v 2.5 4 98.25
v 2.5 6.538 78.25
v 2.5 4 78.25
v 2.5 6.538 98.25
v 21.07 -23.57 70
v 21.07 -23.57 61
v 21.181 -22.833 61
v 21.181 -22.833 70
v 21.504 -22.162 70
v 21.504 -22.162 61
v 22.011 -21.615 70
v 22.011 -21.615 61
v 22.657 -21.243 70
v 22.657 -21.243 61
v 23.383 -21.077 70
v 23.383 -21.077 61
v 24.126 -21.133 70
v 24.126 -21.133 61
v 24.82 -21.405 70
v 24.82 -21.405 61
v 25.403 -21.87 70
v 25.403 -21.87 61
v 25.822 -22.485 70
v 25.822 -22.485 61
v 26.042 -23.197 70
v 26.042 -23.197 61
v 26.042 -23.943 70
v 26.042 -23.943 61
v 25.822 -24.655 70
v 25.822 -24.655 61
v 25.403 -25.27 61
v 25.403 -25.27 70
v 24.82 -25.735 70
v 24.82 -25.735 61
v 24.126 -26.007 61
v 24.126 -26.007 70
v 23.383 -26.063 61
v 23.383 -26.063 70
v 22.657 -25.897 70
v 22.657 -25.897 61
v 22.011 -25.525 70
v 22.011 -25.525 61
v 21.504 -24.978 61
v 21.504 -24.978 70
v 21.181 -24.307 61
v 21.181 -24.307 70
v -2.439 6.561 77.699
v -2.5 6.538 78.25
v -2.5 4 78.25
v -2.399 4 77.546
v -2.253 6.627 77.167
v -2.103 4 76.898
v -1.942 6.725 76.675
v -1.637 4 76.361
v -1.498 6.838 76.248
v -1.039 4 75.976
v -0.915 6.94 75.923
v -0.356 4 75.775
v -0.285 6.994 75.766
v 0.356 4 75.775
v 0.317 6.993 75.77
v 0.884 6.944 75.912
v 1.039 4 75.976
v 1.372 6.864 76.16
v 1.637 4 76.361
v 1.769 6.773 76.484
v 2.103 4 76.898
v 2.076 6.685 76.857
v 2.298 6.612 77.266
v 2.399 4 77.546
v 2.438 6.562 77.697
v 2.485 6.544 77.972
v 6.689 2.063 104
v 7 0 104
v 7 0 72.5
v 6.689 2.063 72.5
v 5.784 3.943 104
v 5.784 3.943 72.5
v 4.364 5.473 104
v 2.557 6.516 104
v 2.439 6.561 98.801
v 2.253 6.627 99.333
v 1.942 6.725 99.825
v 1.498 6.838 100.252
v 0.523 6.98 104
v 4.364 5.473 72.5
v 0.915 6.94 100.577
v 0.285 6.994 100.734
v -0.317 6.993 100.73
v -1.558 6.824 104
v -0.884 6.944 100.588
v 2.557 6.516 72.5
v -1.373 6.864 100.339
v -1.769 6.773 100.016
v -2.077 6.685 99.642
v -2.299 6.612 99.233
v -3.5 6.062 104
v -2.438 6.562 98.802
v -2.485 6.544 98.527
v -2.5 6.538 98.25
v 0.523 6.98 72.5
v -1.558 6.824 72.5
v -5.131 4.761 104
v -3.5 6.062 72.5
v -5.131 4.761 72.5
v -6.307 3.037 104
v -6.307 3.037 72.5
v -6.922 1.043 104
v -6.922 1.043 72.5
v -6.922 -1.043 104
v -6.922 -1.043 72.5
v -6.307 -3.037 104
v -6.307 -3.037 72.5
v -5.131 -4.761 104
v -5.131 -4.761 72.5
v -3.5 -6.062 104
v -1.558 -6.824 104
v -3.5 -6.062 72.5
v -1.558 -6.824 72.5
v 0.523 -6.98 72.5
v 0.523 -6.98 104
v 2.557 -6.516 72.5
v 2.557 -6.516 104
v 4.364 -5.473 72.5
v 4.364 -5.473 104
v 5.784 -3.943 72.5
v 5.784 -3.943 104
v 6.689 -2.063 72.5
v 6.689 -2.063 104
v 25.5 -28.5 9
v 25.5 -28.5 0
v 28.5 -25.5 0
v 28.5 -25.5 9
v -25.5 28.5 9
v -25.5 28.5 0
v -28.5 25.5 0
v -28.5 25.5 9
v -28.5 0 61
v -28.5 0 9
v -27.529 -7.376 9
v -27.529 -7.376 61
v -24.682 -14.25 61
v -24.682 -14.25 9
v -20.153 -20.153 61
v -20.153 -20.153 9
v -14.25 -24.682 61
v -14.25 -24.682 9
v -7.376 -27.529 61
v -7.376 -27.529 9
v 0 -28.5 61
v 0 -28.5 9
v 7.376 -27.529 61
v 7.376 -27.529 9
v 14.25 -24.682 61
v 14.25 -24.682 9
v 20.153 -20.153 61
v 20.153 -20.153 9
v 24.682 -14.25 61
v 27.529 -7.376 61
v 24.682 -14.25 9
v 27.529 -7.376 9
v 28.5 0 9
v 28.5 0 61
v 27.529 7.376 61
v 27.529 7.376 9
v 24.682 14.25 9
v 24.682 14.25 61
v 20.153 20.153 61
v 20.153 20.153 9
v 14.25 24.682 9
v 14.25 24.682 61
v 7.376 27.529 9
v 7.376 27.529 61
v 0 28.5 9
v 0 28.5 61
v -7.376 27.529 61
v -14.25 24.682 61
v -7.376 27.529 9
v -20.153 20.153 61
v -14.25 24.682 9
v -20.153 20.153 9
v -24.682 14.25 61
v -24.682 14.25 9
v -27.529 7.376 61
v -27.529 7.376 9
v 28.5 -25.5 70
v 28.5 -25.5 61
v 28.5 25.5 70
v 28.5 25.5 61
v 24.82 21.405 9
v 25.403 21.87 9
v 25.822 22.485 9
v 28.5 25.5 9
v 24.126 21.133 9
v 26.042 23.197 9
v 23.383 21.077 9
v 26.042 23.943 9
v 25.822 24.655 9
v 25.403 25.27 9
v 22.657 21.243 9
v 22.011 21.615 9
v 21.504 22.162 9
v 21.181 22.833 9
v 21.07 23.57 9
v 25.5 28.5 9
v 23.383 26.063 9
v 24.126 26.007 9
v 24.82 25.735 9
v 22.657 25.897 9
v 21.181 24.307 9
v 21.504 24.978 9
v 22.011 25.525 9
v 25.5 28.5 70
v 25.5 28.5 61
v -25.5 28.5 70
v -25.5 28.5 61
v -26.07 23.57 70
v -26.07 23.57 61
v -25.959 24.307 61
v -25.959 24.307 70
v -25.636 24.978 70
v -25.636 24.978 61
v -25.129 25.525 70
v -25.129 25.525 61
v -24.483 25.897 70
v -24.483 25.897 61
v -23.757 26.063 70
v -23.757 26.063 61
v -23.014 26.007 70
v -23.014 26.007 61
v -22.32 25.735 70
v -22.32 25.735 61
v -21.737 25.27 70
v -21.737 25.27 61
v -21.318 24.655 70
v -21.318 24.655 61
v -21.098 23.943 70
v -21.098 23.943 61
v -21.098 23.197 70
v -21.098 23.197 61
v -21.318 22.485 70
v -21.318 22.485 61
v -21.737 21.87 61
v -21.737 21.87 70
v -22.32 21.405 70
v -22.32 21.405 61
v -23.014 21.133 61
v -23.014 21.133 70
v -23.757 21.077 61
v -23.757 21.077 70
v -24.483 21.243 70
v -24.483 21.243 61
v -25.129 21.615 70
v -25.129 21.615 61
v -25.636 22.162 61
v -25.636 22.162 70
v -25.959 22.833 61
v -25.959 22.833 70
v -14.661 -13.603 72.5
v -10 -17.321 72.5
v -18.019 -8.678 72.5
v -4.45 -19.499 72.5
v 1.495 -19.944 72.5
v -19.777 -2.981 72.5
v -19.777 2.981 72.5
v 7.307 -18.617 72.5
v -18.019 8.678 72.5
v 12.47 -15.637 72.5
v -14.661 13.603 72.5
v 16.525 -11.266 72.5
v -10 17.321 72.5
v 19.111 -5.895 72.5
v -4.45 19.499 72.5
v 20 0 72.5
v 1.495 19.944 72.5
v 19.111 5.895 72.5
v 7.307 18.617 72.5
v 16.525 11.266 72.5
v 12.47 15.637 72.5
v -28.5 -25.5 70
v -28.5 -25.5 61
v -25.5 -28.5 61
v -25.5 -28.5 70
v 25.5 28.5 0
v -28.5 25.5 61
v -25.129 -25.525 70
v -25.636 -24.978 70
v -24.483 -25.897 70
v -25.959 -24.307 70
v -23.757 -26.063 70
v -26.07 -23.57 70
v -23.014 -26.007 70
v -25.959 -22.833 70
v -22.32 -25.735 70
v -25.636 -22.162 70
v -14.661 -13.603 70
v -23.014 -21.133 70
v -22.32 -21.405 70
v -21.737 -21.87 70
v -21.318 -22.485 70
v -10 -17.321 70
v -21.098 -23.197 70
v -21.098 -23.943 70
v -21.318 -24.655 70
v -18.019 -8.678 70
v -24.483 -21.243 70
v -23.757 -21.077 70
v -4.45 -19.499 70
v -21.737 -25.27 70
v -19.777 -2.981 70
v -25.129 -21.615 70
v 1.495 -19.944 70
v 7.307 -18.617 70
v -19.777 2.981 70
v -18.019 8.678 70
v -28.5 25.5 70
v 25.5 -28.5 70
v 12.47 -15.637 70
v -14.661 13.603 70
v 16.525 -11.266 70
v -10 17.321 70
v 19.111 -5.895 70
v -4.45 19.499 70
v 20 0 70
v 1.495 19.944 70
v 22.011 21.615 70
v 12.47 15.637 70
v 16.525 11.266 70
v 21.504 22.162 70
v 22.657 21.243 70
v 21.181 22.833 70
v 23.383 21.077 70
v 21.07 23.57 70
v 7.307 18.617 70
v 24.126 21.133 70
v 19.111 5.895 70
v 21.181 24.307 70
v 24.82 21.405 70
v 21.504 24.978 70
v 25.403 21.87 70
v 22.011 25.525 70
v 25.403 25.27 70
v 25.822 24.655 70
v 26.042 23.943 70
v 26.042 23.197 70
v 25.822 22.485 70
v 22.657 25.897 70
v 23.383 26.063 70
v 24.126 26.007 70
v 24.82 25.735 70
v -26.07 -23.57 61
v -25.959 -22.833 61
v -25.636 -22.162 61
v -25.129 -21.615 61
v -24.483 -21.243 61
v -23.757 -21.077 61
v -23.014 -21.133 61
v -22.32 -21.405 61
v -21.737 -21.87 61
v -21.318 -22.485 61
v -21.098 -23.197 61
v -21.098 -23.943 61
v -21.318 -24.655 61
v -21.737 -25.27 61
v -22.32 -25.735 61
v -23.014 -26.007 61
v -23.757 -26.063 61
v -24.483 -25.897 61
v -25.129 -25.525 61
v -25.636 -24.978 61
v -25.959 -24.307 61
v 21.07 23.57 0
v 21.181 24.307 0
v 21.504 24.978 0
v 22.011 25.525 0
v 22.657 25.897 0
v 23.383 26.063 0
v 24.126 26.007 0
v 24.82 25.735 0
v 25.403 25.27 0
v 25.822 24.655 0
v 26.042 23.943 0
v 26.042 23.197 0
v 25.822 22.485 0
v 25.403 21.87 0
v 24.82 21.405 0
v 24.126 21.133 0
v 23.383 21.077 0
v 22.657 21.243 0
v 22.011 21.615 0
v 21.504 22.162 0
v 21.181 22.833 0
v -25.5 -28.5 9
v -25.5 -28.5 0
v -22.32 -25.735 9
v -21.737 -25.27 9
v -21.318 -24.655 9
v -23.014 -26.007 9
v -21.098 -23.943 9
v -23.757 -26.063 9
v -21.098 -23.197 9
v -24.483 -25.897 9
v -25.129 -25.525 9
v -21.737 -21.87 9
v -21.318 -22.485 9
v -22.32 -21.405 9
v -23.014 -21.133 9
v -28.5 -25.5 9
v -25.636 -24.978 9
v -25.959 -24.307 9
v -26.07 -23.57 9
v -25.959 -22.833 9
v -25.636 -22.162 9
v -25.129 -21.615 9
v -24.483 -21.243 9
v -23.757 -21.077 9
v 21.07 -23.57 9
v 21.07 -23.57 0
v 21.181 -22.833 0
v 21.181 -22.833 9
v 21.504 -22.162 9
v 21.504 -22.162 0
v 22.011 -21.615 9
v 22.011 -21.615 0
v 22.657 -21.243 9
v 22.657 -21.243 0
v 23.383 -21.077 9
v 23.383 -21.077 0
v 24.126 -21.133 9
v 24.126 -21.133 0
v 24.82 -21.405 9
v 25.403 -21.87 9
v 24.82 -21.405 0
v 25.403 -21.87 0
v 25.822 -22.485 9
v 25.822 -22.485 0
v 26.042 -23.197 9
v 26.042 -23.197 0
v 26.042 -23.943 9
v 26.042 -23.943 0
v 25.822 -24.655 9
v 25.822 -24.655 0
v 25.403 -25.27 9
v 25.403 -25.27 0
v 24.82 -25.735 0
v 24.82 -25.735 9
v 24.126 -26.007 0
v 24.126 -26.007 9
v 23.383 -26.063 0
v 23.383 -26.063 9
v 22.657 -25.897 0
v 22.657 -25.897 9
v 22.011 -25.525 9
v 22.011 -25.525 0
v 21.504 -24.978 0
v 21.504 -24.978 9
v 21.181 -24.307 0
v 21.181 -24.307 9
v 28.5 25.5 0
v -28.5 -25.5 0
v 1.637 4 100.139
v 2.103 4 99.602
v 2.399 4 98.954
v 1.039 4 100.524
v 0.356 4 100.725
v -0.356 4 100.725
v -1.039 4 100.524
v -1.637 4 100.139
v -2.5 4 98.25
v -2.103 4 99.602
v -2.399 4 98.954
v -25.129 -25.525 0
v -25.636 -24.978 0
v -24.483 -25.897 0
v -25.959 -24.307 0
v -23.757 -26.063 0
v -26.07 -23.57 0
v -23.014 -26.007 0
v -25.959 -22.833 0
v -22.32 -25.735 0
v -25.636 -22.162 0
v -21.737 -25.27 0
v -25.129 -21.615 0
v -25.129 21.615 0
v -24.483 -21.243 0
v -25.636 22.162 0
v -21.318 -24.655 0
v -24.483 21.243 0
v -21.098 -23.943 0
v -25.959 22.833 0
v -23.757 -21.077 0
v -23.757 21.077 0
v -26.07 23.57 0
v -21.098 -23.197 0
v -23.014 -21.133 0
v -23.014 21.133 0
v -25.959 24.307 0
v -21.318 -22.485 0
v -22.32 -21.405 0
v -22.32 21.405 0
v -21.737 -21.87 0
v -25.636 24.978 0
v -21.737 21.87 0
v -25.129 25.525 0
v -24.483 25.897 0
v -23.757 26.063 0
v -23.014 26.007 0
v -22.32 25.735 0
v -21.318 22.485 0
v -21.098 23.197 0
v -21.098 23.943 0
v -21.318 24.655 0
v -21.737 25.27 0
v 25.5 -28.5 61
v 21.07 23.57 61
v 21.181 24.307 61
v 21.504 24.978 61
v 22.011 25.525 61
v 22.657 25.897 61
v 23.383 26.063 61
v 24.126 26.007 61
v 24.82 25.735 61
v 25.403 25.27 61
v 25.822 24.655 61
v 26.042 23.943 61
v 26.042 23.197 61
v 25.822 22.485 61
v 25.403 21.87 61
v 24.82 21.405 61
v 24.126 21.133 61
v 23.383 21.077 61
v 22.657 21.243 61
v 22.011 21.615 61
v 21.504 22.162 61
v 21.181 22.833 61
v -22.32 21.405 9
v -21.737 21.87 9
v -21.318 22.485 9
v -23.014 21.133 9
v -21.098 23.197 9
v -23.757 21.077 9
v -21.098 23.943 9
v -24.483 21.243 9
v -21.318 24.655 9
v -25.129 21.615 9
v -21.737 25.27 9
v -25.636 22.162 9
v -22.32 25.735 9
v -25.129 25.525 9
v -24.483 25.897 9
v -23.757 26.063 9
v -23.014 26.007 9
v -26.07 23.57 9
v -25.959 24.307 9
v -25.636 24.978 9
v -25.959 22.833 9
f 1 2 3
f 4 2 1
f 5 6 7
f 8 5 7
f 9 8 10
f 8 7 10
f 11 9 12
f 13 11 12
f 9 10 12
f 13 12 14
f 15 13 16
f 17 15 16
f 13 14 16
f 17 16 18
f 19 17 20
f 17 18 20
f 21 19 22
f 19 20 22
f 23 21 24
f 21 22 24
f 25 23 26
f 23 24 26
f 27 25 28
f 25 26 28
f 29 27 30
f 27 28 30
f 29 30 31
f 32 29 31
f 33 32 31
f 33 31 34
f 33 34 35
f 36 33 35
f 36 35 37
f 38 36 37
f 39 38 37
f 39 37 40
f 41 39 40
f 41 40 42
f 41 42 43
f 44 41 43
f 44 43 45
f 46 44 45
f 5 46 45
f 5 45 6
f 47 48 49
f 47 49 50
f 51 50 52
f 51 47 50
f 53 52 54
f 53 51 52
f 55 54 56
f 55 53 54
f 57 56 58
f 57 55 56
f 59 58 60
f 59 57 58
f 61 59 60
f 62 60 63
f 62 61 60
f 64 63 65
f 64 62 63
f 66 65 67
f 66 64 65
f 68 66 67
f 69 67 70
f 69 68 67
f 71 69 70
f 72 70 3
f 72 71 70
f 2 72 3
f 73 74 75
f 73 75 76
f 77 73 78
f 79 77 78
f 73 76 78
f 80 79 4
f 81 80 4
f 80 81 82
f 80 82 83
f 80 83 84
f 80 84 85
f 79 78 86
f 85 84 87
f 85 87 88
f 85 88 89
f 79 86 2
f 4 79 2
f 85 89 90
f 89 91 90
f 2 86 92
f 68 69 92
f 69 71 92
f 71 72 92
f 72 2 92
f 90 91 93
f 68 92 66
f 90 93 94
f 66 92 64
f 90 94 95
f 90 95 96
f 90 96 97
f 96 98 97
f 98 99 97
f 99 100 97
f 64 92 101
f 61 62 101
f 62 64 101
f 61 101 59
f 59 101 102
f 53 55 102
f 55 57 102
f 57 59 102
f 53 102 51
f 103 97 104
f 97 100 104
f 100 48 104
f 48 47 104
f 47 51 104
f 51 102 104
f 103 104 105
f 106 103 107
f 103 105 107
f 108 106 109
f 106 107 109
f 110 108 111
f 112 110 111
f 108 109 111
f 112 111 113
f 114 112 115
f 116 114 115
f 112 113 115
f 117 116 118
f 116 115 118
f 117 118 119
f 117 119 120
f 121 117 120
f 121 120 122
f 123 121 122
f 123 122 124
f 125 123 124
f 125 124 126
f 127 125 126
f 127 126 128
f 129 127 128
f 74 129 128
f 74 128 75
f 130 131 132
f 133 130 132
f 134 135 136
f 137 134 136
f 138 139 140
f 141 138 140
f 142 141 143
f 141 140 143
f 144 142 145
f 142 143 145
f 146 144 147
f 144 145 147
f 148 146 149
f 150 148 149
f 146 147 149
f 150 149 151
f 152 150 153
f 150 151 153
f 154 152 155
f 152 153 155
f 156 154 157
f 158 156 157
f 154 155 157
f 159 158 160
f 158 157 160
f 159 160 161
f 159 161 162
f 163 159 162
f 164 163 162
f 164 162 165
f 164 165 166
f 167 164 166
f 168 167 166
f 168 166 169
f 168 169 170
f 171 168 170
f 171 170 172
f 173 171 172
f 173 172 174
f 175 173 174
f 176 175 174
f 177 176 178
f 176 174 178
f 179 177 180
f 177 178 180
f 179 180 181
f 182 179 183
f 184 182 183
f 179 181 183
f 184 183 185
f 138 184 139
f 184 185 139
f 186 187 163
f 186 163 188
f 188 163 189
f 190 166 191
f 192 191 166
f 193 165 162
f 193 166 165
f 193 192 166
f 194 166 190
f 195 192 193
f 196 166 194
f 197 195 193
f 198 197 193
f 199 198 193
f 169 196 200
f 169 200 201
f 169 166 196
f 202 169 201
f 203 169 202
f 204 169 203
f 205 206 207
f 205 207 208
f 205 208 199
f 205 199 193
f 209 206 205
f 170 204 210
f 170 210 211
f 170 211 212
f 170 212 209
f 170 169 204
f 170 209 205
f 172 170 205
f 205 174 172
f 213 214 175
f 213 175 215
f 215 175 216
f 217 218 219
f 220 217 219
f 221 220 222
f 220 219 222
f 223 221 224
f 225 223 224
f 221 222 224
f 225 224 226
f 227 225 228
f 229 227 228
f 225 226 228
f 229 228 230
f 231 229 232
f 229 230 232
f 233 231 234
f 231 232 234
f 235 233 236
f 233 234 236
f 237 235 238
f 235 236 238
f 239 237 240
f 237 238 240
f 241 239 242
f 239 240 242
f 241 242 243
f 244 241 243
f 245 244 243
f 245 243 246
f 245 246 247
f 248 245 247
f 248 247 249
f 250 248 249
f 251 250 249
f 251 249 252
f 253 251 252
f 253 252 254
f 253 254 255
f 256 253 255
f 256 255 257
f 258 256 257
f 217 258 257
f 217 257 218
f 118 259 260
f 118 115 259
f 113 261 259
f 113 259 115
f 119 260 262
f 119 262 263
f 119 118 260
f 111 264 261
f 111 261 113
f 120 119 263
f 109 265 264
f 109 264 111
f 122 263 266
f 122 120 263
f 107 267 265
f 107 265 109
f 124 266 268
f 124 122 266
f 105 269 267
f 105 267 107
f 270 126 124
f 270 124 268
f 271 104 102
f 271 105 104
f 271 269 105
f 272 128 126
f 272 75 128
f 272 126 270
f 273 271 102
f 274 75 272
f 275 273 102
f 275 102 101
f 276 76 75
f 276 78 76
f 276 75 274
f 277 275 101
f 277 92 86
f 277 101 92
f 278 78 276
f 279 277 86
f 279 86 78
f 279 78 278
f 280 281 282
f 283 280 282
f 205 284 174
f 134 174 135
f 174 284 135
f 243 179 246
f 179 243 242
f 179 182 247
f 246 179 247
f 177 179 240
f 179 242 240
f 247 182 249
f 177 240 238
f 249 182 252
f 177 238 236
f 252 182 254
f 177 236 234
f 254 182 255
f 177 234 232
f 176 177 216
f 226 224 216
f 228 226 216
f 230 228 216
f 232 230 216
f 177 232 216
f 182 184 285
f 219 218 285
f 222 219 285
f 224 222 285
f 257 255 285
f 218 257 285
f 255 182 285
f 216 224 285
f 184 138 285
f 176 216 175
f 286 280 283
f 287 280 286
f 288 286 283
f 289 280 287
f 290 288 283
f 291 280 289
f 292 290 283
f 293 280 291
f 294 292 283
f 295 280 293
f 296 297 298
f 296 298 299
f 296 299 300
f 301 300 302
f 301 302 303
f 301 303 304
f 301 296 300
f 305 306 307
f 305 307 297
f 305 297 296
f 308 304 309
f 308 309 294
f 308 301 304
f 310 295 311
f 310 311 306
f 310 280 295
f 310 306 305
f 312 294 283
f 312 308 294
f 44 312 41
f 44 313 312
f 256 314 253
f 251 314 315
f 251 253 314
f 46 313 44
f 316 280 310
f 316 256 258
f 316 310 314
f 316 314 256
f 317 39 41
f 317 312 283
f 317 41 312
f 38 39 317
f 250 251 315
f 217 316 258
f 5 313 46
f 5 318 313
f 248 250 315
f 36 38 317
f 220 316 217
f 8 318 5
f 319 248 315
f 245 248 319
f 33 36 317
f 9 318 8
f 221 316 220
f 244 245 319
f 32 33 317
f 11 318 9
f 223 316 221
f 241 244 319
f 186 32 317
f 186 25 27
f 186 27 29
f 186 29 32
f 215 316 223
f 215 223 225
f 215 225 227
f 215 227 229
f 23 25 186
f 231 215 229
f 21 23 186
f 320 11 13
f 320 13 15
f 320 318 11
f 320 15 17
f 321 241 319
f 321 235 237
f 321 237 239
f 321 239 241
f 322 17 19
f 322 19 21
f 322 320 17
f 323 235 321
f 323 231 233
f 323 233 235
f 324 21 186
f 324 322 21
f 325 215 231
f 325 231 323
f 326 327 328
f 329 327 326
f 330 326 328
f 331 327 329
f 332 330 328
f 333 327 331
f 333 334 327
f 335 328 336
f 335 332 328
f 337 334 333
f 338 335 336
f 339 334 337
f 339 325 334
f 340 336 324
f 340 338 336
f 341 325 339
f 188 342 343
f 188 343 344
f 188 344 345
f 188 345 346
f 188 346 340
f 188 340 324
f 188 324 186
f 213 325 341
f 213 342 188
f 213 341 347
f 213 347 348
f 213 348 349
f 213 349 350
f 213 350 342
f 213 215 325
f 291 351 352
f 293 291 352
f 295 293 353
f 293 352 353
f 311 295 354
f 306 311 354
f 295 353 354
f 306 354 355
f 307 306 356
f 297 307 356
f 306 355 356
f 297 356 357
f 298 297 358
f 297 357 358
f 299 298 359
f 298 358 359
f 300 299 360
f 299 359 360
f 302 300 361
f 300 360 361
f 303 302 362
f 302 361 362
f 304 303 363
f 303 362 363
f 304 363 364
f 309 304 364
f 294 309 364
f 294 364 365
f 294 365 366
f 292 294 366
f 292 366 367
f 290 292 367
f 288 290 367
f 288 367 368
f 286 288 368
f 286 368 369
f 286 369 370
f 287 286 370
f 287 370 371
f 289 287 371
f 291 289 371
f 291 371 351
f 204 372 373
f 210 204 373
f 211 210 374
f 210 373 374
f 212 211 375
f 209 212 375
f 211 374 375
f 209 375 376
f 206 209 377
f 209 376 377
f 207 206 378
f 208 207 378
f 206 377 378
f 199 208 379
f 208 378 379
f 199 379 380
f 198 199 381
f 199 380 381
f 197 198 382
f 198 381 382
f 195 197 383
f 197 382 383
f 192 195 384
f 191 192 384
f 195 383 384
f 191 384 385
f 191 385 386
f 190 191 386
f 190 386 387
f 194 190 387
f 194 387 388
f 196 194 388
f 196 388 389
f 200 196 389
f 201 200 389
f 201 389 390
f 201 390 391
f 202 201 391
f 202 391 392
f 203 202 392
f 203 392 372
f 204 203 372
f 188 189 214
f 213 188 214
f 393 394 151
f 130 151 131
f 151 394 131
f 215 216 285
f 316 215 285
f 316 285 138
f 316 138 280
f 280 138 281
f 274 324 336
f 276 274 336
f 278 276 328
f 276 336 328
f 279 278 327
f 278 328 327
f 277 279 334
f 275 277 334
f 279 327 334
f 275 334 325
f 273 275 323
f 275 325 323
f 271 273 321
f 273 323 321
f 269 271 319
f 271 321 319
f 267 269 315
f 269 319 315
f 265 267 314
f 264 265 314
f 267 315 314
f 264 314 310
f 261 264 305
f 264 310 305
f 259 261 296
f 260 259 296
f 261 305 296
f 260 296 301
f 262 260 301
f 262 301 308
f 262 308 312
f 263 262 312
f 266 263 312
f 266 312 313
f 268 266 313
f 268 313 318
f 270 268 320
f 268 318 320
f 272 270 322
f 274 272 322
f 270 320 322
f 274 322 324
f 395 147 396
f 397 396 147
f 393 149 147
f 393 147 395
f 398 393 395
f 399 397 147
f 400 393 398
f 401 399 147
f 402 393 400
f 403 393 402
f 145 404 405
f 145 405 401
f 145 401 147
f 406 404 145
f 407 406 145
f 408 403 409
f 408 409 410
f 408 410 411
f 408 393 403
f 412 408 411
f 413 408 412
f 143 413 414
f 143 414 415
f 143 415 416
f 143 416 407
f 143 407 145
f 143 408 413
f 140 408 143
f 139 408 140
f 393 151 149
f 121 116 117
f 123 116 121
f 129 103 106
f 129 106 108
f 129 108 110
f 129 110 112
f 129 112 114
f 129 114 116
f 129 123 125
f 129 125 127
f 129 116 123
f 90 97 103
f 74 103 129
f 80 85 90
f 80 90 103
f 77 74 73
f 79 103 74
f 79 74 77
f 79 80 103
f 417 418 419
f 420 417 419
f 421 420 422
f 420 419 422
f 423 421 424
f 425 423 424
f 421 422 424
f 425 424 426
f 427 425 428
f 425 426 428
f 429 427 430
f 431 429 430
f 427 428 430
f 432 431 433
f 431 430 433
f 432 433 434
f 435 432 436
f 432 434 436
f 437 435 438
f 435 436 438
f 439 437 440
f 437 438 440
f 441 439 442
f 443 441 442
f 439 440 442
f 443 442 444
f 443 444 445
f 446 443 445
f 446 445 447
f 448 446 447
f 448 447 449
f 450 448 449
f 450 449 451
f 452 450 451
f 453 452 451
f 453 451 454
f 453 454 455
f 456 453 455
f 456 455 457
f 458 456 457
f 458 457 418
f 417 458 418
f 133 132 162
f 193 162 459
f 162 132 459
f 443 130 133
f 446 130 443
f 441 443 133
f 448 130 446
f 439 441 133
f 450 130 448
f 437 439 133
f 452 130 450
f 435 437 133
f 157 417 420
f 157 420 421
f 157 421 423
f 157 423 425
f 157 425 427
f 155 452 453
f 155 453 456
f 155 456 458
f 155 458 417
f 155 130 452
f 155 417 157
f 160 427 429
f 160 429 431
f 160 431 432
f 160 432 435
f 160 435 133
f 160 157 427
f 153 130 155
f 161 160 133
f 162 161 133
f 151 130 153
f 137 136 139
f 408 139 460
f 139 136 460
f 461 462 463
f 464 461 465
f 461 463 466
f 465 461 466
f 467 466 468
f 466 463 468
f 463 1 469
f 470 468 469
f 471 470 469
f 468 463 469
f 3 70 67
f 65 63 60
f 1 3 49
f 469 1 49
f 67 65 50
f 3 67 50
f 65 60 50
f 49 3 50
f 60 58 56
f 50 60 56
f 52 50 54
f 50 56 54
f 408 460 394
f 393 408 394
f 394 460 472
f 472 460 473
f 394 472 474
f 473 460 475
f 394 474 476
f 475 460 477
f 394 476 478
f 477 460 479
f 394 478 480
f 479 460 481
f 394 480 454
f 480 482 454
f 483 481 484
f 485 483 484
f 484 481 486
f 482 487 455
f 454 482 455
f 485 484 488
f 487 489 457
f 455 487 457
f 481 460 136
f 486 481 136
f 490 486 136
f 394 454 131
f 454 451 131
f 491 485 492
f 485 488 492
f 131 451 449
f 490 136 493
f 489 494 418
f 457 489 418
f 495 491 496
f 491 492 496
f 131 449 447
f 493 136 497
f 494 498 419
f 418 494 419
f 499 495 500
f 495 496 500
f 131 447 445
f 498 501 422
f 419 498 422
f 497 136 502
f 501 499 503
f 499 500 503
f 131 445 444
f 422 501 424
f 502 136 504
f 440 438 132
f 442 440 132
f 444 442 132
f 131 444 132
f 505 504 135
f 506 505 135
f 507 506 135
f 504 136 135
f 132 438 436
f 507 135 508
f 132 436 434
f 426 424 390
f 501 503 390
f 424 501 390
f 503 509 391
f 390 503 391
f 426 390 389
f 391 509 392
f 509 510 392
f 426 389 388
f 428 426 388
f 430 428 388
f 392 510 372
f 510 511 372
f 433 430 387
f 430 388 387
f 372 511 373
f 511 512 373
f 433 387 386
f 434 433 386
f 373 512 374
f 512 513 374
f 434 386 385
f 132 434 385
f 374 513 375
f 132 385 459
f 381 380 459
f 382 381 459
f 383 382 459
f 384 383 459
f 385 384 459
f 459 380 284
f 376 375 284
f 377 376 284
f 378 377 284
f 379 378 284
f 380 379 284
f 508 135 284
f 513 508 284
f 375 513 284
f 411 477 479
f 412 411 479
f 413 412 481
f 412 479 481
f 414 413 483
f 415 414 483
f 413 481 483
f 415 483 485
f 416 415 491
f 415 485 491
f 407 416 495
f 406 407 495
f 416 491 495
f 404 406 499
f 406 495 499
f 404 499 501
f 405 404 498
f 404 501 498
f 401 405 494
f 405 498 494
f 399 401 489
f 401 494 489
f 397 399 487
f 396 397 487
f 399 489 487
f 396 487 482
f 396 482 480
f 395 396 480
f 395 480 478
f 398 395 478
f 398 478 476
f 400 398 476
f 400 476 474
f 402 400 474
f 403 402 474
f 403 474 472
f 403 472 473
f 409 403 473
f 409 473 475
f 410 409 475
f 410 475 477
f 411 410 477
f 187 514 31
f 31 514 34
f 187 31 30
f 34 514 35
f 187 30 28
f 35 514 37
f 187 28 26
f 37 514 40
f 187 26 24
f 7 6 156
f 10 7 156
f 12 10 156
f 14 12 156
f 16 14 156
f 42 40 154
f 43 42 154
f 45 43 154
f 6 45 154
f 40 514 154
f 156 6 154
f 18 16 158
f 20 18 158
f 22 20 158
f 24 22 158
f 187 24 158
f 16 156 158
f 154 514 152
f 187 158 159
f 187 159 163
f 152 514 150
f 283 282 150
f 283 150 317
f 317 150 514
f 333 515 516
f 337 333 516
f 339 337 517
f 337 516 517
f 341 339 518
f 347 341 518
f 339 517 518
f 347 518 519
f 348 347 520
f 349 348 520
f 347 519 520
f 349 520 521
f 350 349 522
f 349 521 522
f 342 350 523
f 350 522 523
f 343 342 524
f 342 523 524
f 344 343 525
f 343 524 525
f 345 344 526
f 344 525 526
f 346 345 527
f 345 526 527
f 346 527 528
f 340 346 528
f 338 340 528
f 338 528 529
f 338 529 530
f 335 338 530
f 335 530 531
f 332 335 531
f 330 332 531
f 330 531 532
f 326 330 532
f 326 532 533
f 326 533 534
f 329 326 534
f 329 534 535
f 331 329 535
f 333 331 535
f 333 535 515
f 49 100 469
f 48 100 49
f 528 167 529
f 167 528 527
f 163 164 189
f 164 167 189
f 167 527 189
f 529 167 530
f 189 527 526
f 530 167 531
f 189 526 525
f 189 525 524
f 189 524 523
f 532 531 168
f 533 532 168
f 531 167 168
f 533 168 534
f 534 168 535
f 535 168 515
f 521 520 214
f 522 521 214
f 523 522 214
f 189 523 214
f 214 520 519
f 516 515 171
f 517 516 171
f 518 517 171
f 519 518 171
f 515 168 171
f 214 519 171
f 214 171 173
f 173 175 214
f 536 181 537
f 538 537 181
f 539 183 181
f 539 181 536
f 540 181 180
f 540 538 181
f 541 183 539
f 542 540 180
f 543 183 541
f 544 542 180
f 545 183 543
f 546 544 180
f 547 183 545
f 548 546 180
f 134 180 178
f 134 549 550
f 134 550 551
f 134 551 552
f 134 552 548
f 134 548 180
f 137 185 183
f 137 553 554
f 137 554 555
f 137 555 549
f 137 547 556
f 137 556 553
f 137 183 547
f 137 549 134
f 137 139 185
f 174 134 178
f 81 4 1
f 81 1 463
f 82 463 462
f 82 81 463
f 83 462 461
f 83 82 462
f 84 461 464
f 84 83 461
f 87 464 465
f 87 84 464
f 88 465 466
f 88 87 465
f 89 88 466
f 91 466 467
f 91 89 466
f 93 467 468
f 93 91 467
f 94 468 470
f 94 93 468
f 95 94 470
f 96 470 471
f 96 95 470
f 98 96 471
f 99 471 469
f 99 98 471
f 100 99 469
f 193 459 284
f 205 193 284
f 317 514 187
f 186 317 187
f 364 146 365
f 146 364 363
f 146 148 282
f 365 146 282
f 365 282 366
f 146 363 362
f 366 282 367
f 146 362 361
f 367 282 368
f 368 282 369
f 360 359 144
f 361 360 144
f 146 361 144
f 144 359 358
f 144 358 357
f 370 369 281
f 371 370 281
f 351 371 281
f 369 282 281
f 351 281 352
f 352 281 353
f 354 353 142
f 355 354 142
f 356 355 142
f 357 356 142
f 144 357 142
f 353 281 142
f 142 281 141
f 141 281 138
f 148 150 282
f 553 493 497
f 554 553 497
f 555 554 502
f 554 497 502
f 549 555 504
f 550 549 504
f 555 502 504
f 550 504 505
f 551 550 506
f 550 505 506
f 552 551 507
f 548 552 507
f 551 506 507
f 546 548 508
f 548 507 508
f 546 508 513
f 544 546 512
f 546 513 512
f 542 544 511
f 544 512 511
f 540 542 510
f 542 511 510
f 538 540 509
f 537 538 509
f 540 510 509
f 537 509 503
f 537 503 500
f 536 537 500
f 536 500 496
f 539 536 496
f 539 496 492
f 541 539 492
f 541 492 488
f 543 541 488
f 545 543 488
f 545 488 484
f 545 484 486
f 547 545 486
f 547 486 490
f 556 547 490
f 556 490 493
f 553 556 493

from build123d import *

# Parameters (mm, degrees)
BOSS_EXTRUDE1_DEPTH     = 70
SKETCH2_R               = 2.5
CUT_EXTRUDE1_DEPTH      = 81.774377125
CUT_EXTRUDE2_DEPTH      = 81.774377125
CUT_EXTRUDE2_DEPTH_BACK = 81.774377125
SKETCH3_W               = 52
SKETCH3_H               = 57
SKETCH4_R               = 28.5
BOSS_EXTRUDE2_DEPTH     = 52
SKETCH5_R               = 20
BOSS_EXTRUDE3_DEPTH     = 2.5
SKETCH6_R               = 7
BOSS_EXTRUDE4_DEPTH     = 31.5
CUT_EXTRUDE3_DEPTH      = 5


with BuildPart() as part:
    # Sketch1 → Boss-Extrude1 (new body)
    with BuildSketch(Plane.XY):
        Polygon((-28.5, -25.5), (-25.5, -28.5), (25.5, -28.5), (28.5, -25.5), (28.5, 25.5), (25.5, 28.5), (-25.5, 28.5), (-28.5, 25.5), align=None)
    extrude(amount=BOSS_EXTRUDE1_DEPTH)

    # Sketch2 → Cut-Extrude1 (cut, through all)
    with BuildSketch(Plane(origin=(0, 0, 0), x_dir=(-1, 0, 0), z_dir=(0, 0, -1))):
        with Locations((-23.57, 23.57)):
            Circle(SKETCH2_R)
        with Locations((-23.57, -23.57)):
            Circle(SKETCH2_R)
        with Locations((23.57, -23.57)):
            Circle(SKETCH2_R)
        with Locations((23.57, 23.57)):
            Circle(SKETCH2_R)
    extrude(amount=-CUT_EXTRUDE1_DEPTH, mode=Mode.SUBTRACT)

    # Sketch3 → Cut-Extrude2 (cut, two sides: drawn at the far end of the back side and taken through both)
    with BuildSketch(Plane(origin=(0, 0, 0), x_dir=(0, 0, -1), z_dir=(1, 0, 0)).offset(-CUT_EXTRUDE2_DEPTH_BACK)):
        with Locations((-35, 0)):
            Rectangle(SKETCH3_W, SKETCH3_H)
    extrude(amount=CUT_EXTRUDE2_DEPTH + CUT_EXTRUDE2_DEPTH_BACK, mode=Mode.SUBTRACT)


with BuildPart() as cut_extrude2_piece_1:
    # of the separate pieces the step leaves, piece 1, a body of its own (cut_extrude2_pieces)
    add(part.part.solids().sort_by_distance((-28.5, -25.5, 61))[0])



with BuildPart() as cut_extrude2_piece_2:
    # of the separate pieces the step leaves, piece 2, a body of its own (cut_extrude2_pieces)
    add(part.part.solids().sort_by_distance((-28.5, -25.5, 0))[0])


with BuildPart() as cut_extrude2_piece_1_1:
    add(cut_extrude2_piece_1.part)

    add(cut_extrude2_piece_2.part)  # Boss-Extrude2 merges Cut-Extrude2 piece 2
    # Sketch4 → Boss-Extrude2 (add)
    with BuildSketch(Plane.XY.offset(9)):
        with Locations(Location((0, 0, 0), (0, 0, 180))):
            Circle(SKETCH4_R)
    extrude(amount=BOSS_EXTRUDE2_DEPTH)

    # Sketch5 → Boss-Extrude3 (add)
    with BuildSketch(Plane.XY.offset(70)):
        Circle(SKETCH5_R)
    extrude(amount=BOSS_EXTRUDE3_DEPTH)

    # Sketch6 → Boss-Extrude4 (add)
    with BuildSketch(Plane.XY.offset(72.5)):
        Circle(SKETCH6_R)
    extrude(amount=BOSS_EXTRUDE4_DEPTH)

    # Sketch7 → Cut-Extrude3 (cut)
    with BuildSketch(Plane(origin=(0, 9, 0), x_dir=(1, 0, 0), z_dir=(0, 1, 0))):
        with BuildLine():
            Line((-2.5, -98.25), (-2.5, -78.25))
            ThreePointArc((-2.5, -78.25), (0, -75.75), (2.5, -78.25))
            Line((2.5, -78.25), (2.5, -98.25))
            ThreePointArc((2.5, -98.25), (0, -100.75), (-2.5, -98.25))
        make_face()
    extrude(amount=-CUT_EXTRUDE3_DEPTH, mode=Mode.SUBTRACT)


solid = cut_extrude2_piece_1_1.part
